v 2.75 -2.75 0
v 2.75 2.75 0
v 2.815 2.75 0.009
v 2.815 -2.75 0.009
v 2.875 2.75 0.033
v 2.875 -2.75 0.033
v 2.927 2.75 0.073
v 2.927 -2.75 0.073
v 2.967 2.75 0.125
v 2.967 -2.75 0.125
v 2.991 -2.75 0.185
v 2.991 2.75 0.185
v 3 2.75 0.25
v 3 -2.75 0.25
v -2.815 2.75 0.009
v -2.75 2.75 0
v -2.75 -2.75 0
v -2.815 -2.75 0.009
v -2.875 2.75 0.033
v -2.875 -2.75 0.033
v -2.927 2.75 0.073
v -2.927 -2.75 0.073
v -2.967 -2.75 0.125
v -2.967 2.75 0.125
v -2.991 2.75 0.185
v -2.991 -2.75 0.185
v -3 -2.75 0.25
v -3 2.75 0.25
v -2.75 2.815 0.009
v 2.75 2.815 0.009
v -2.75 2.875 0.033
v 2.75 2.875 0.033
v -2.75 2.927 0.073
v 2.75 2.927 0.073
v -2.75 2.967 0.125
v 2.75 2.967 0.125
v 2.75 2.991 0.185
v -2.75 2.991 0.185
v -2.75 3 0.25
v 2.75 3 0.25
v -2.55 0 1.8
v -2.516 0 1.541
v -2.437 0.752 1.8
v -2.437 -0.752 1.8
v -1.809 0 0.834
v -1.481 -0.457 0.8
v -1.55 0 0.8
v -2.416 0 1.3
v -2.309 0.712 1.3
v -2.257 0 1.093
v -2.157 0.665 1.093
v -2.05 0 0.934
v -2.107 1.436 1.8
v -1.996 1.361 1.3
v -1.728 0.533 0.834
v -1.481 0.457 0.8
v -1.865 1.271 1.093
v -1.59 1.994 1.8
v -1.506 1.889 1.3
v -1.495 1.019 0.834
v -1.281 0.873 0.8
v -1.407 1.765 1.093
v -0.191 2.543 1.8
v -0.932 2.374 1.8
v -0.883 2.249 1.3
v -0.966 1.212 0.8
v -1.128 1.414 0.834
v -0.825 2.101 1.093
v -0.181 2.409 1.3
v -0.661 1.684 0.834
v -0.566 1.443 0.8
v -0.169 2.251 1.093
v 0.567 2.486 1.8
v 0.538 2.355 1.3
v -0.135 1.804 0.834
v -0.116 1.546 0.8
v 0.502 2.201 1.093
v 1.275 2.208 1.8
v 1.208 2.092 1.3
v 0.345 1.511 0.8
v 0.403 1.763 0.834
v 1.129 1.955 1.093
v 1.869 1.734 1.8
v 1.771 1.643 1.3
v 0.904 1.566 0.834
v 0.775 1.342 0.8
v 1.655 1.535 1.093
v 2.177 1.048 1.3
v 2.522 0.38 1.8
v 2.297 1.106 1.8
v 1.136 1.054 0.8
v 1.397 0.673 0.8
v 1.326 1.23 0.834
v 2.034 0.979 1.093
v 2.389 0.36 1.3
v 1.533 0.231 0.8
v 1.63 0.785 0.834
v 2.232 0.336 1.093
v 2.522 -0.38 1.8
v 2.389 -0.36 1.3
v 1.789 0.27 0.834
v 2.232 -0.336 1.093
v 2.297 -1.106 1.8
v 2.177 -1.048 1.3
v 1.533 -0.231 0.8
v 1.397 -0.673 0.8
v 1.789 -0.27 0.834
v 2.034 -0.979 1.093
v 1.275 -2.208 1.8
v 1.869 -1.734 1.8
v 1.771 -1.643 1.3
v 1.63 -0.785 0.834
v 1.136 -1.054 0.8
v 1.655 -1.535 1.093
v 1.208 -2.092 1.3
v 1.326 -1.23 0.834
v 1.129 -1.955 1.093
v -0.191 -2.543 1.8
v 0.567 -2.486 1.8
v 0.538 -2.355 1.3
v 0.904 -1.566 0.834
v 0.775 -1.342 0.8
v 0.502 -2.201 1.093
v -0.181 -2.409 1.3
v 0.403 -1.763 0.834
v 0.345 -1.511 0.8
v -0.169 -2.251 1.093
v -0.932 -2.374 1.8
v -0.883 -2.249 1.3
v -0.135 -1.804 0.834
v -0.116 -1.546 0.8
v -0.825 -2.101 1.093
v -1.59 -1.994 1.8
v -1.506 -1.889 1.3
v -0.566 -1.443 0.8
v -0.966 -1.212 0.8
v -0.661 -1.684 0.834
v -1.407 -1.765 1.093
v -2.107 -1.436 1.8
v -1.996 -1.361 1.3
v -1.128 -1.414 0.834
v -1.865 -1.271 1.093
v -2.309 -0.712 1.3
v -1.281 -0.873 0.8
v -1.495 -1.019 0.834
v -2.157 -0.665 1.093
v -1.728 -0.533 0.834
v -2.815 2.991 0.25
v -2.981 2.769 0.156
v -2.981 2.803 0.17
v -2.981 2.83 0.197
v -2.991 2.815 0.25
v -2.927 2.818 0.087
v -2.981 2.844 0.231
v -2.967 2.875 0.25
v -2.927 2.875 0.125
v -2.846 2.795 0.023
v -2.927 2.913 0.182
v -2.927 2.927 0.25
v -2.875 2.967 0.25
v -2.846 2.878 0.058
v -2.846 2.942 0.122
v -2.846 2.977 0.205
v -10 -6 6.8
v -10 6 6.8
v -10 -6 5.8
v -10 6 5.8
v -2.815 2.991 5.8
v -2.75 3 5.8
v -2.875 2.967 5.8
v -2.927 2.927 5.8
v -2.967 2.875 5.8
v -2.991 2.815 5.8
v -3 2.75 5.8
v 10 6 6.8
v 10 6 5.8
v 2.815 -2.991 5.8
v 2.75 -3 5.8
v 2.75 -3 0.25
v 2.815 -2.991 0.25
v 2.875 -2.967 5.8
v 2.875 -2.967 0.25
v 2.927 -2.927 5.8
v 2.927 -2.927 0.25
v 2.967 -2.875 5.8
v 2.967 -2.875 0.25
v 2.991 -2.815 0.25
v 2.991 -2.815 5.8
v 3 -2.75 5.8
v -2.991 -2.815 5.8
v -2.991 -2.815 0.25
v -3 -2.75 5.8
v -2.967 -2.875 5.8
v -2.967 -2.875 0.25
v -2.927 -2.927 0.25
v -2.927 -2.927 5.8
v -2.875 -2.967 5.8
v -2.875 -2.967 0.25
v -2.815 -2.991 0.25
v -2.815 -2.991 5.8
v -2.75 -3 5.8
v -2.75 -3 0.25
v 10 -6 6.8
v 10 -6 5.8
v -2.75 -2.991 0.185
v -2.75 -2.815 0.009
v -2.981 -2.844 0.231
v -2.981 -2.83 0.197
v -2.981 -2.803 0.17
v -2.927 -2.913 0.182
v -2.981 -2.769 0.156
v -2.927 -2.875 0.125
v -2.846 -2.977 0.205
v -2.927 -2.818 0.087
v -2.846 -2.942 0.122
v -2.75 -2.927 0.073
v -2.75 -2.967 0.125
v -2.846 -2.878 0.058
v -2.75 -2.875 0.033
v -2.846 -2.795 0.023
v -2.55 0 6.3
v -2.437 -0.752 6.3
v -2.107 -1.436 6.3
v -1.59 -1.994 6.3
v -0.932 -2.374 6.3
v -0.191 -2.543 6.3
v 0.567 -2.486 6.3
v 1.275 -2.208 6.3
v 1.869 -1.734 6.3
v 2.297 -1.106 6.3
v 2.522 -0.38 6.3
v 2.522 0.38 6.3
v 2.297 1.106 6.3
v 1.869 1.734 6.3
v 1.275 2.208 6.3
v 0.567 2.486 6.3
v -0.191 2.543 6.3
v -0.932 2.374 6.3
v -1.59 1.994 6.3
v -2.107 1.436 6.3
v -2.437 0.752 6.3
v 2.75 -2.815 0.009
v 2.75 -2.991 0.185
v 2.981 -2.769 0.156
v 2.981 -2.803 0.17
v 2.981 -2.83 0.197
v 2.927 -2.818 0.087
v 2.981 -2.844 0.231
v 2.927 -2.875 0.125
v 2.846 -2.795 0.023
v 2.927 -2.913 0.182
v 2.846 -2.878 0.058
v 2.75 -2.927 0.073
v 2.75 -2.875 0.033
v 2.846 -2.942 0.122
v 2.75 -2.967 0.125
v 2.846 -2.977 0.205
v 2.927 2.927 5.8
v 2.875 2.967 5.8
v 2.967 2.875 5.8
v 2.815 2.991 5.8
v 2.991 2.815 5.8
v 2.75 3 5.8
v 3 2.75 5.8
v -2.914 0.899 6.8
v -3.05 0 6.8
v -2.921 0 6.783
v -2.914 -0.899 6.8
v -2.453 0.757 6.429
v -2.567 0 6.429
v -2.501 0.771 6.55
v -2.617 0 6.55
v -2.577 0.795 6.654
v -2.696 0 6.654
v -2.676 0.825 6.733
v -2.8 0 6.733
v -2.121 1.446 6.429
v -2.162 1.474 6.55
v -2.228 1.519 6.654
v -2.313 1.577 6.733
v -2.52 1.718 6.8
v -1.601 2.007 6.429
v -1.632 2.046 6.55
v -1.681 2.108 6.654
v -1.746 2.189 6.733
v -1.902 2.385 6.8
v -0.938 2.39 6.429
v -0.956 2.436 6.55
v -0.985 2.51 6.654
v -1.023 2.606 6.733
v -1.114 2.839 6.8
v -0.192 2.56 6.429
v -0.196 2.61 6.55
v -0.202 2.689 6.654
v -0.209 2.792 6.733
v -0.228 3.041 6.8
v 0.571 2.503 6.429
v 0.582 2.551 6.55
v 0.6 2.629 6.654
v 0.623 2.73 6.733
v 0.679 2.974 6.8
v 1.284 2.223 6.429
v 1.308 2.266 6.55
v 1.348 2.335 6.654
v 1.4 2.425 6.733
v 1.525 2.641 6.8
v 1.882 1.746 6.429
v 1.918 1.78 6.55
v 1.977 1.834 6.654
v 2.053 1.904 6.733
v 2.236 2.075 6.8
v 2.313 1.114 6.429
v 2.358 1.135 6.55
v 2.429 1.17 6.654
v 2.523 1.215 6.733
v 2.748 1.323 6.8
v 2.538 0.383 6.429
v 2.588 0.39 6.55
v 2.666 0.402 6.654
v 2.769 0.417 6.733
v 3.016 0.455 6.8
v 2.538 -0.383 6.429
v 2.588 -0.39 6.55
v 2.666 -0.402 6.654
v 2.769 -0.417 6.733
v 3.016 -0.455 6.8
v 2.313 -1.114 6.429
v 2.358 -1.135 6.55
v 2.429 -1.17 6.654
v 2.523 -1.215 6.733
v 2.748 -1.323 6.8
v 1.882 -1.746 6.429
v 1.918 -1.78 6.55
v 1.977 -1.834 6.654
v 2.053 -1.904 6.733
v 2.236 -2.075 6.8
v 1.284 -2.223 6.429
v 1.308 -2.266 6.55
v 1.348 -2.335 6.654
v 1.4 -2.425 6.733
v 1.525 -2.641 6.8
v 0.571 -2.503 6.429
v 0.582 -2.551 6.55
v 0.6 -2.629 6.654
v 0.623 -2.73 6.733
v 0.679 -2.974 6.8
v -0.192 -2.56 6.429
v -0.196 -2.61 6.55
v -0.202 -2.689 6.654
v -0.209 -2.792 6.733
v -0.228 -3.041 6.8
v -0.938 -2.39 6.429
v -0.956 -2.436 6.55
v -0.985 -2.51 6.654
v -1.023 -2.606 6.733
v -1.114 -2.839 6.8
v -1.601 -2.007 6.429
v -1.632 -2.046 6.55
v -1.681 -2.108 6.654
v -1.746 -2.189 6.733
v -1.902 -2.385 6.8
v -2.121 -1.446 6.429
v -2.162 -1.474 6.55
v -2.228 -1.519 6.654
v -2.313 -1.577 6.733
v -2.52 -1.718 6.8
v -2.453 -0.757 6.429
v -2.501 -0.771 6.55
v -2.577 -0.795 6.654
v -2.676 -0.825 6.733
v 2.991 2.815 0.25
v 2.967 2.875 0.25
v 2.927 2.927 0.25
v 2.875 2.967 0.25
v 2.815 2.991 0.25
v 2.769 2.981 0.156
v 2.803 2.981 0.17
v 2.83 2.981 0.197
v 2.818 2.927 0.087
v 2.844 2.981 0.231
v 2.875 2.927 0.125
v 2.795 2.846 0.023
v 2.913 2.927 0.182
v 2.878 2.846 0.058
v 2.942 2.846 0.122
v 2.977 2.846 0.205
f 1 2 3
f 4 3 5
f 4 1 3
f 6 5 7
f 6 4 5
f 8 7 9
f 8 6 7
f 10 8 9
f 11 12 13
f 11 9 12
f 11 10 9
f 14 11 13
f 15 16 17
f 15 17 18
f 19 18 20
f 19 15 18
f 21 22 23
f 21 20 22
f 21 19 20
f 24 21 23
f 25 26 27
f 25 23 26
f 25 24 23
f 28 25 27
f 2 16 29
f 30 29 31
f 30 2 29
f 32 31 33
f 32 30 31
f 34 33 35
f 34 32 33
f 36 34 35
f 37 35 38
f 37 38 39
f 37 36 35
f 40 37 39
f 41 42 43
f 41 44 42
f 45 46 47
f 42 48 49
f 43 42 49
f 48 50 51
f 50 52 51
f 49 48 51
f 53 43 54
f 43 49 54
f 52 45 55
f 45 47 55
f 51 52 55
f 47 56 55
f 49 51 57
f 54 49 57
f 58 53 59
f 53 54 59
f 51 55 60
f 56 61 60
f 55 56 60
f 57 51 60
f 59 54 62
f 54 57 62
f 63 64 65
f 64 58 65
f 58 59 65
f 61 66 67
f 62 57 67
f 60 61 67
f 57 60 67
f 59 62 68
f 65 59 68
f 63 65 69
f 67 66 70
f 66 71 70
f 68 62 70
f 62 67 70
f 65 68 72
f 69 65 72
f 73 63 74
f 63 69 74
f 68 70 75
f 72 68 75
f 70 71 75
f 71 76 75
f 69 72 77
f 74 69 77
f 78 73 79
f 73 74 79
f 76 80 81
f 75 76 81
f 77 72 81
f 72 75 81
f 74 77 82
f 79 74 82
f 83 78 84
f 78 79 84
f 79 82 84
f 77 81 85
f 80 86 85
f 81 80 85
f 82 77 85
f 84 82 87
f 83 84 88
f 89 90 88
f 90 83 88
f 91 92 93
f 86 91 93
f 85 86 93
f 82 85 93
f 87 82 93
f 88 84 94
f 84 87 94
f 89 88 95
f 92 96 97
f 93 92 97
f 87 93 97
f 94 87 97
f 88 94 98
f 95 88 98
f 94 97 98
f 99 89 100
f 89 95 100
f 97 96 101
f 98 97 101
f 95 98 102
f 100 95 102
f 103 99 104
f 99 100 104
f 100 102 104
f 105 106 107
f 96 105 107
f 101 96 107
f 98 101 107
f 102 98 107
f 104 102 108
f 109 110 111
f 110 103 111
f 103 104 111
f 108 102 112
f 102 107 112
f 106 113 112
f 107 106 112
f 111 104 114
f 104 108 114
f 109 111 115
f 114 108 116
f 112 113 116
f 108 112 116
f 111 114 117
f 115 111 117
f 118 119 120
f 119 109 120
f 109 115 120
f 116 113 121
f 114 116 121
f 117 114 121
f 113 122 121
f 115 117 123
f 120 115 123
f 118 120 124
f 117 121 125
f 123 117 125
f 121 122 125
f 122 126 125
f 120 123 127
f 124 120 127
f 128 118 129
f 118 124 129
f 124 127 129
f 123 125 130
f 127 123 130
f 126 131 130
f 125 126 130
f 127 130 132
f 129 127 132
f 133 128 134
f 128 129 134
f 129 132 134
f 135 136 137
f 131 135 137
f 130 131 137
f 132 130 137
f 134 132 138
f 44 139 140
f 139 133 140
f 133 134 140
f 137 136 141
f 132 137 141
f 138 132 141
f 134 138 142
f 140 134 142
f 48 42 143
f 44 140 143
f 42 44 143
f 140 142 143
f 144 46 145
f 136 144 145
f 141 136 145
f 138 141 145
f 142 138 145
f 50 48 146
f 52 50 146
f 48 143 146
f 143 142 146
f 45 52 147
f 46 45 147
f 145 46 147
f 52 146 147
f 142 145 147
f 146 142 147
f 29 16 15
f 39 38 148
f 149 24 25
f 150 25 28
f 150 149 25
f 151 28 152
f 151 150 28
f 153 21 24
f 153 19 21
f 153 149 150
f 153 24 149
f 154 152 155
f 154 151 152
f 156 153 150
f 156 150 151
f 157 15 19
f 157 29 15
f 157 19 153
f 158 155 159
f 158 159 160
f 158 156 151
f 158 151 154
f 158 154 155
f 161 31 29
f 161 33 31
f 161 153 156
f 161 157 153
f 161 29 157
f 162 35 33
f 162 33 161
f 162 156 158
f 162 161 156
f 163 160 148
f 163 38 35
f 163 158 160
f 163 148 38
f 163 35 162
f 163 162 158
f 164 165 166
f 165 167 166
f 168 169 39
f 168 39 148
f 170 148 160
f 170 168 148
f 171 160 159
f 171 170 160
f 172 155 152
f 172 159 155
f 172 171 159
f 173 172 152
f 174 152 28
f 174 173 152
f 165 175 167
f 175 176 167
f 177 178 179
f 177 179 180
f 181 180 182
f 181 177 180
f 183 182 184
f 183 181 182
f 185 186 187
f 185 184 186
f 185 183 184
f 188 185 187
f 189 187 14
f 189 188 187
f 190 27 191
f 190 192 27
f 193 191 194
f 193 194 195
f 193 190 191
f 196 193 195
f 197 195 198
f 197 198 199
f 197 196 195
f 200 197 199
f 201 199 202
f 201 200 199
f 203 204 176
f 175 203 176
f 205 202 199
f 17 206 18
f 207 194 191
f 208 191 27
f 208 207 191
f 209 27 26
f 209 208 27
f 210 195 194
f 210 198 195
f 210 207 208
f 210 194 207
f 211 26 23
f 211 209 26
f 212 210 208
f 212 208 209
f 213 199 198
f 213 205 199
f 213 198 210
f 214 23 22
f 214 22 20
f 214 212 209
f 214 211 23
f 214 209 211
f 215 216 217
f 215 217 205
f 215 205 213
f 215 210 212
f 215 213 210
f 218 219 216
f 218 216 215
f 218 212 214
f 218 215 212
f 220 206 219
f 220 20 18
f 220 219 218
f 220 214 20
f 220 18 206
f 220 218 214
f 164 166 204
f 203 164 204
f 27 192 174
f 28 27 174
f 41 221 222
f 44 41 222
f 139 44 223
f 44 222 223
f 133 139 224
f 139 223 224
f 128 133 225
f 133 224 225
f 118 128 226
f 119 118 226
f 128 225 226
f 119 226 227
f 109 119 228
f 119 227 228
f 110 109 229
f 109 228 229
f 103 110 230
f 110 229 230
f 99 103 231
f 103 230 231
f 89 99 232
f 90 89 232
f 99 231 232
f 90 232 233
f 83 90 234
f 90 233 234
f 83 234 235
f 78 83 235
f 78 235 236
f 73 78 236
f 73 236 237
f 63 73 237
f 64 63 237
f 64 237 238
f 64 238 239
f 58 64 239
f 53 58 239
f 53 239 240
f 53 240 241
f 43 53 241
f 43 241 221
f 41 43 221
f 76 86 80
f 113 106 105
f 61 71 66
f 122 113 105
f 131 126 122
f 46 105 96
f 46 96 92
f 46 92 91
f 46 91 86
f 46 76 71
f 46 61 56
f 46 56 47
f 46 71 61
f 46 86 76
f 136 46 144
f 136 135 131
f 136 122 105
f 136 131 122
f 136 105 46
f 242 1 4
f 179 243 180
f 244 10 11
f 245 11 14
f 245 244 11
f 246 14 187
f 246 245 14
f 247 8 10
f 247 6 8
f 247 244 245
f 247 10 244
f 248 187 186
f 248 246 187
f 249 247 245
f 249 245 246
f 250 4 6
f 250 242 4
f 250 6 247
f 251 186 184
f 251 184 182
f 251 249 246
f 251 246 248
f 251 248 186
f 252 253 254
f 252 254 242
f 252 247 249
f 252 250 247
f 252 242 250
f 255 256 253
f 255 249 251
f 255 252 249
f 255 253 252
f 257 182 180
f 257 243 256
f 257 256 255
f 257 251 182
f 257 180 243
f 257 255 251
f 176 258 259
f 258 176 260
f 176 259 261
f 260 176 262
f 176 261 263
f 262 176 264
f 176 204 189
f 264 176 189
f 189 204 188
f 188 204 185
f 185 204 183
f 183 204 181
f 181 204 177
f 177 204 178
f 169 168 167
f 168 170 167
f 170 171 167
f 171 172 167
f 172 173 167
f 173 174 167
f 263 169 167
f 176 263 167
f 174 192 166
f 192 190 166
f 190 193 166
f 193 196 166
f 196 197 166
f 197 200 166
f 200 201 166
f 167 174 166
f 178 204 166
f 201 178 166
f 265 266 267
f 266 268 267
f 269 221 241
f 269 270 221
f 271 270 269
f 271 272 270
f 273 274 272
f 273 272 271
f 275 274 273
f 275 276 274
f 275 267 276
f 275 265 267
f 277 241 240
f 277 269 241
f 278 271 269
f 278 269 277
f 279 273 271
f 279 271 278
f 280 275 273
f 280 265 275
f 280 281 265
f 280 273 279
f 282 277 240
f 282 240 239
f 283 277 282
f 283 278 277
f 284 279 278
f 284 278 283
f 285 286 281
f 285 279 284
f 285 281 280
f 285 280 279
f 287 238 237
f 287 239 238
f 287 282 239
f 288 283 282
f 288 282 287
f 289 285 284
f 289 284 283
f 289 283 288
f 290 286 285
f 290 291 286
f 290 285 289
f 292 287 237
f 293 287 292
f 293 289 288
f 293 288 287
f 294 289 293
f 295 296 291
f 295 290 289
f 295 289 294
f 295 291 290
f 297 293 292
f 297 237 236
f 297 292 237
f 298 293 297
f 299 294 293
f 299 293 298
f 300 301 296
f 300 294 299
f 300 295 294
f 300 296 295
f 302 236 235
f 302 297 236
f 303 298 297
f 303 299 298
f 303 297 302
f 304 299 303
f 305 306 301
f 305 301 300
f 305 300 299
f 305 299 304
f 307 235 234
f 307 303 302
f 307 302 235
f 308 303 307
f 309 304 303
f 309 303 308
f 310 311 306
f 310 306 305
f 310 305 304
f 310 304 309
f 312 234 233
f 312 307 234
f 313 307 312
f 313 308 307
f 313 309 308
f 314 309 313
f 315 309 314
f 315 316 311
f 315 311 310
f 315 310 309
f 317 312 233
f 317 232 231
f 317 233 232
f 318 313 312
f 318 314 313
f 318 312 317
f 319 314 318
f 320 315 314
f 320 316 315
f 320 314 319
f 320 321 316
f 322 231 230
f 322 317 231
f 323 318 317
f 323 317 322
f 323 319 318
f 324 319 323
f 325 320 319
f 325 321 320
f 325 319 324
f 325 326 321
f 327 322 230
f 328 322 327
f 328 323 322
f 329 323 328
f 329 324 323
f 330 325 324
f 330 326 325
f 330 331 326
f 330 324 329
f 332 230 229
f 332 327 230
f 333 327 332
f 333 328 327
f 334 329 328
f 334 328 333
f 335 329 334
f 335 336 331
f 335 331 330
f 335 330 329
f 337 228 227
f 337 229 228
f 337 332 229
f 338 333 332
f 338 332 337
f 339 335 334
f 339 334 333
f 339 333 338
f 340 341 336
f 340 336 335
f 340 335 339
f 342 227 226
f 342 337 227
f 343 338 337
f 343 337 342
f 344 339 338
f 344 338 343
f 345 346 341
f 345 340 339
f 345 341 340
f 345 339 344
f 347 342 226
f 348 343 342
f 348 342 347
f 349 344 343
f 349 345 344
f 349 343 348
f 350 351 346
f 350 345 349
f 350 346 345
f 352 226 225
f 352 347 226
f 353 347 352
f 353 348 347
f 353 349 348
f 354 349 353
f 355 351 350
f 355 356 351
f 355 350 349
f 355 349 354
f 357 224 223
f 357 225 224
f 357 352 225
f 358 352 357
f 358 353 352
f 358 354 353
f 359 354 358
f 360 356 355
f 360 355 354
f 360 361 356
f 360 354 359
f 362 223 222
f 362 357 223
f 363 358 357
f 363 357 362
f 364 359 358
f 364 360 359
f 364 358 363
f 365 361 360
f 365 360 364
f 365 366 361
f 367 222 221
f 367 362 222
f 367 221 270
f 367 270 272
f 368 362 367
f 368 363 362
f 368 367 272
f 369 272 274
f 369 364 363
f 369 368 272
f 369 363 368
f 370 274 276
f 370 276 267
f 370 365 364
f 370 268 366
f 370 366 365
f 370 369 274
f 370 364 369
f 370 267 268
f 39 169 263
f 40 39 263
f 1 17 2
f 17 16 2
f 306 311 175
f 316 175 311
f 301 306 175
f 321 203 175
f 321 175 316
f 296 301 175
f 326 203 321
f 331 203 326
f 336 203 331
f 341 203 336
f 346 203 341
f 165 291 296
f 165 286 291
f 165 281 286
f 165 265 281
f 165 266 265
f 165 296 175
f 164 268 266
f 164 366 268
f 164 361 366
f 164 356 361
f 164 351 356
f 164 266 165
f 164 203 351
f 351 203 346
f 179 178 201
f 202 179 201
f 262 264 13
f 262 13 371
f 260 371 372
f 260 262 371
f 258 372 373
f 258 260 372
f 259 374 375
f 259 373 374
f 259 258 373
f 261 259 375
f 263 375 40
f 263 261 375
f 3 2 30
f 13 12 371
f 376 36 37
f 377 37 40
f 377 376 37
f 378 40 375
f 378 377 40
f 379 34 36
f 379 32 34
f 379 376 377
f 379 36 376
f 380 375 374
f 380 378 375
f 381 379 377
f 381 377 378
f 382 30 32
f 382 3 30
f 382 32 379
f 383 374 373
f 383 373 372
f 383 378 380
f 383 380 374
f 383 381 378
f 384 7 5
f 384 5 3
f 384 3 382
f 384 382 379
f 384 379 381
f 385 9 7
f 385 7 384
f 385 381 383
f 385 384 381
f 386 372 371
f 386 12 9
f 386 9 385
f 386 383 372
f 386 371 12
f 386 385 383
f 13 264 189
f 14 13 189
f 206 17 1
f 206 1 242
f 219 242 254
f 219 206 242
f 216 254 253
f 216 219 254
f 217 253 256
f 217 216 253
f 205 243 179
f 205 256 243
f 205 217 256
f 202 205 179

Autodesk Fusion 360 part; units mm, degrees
sketch "Sketch2" plane through (0, 0, 0) normal (0, 0, 1) x (1, 0, 0)
  line L0 (3, -3) -> (-3, -3)
  line L1 (-3, -3) -> (-3, 3)
  line L2 (-3, 3) -> (3, 3)
  line L3 (3, 3) -> (3, -3)
  line L4 (3, -3) -> (-3, 3) construction
  line L5 (-3, -3) -> (3, 3) construction
  dimension "d1" = 6
  dimension "d2" = 6
extrude "Extrude1" add sketch "Sketch2" along normal blind 5.8
sketch "Sketch3" plane through (0, 0, 5.8) normal (0, 0, 1) x (-1, 0, 0)
  line L0 (-3, -3) -> (3, -3)
  line L1 (3, -3) -> (3, 3)
  line L2 (3, 3) -> (-3, 3)
  line L3 (-3, 3) -> (-3, -3)
  line L4 (10, 6) -> (-10, 6)
  line L5 (-10, 6) -> (-10, -6)
  line L6 (-10, -6) -> (10, -6)
  line L7 (10, -6) -> (10, 6)
  dimension "d17" = 20
  dimension "d18" = 10
  dimension "d19" = 12
  dimension "d20" = 6
extrude "Extrude2" add sketch "Sketch3" along normal blind 1 contours L0 L1 L2 L3 | L4 L5 L6 L7
fillet "Fillet1" radius 0.25 8 edges at (0, -3, 0) (3, -3, 2.9) (3, 0, 0) (3, 3, 2.9) (0, 3, 0) (-3, 0, 0) (-3, -3, 2.9) (-3, 3, 2.9)
sketch "Sketch4" plane through (0, 0, 6.8) normal (0, 0, 1) x (-1, 0, 0)
  line L0 (10, -6) -> (10, 6)
  line L1 (10, 6) -> (-10, 6)
  line L2 (-10, 6) -> (-10, -6)
  line L3 (-10, -6) -> (10, -6)
  circle A0 centre (0, 0) radius 2.55
  dimension "d10" = 5.1
extrude "Extrude3" cut sketch "Sketch4" against normal blind 6 contours A0
fillet "Fillet2" radius 1 1 edges at (2.3774, -0.9221, 0.8)
fillet "Fillet3" radius 0.5 1 edges at (2.3774, -0.9221, 6.8)
equation "d2 = d1"
equation "d18 = d17 / 2"
equation "d20 = d19 / 2"
